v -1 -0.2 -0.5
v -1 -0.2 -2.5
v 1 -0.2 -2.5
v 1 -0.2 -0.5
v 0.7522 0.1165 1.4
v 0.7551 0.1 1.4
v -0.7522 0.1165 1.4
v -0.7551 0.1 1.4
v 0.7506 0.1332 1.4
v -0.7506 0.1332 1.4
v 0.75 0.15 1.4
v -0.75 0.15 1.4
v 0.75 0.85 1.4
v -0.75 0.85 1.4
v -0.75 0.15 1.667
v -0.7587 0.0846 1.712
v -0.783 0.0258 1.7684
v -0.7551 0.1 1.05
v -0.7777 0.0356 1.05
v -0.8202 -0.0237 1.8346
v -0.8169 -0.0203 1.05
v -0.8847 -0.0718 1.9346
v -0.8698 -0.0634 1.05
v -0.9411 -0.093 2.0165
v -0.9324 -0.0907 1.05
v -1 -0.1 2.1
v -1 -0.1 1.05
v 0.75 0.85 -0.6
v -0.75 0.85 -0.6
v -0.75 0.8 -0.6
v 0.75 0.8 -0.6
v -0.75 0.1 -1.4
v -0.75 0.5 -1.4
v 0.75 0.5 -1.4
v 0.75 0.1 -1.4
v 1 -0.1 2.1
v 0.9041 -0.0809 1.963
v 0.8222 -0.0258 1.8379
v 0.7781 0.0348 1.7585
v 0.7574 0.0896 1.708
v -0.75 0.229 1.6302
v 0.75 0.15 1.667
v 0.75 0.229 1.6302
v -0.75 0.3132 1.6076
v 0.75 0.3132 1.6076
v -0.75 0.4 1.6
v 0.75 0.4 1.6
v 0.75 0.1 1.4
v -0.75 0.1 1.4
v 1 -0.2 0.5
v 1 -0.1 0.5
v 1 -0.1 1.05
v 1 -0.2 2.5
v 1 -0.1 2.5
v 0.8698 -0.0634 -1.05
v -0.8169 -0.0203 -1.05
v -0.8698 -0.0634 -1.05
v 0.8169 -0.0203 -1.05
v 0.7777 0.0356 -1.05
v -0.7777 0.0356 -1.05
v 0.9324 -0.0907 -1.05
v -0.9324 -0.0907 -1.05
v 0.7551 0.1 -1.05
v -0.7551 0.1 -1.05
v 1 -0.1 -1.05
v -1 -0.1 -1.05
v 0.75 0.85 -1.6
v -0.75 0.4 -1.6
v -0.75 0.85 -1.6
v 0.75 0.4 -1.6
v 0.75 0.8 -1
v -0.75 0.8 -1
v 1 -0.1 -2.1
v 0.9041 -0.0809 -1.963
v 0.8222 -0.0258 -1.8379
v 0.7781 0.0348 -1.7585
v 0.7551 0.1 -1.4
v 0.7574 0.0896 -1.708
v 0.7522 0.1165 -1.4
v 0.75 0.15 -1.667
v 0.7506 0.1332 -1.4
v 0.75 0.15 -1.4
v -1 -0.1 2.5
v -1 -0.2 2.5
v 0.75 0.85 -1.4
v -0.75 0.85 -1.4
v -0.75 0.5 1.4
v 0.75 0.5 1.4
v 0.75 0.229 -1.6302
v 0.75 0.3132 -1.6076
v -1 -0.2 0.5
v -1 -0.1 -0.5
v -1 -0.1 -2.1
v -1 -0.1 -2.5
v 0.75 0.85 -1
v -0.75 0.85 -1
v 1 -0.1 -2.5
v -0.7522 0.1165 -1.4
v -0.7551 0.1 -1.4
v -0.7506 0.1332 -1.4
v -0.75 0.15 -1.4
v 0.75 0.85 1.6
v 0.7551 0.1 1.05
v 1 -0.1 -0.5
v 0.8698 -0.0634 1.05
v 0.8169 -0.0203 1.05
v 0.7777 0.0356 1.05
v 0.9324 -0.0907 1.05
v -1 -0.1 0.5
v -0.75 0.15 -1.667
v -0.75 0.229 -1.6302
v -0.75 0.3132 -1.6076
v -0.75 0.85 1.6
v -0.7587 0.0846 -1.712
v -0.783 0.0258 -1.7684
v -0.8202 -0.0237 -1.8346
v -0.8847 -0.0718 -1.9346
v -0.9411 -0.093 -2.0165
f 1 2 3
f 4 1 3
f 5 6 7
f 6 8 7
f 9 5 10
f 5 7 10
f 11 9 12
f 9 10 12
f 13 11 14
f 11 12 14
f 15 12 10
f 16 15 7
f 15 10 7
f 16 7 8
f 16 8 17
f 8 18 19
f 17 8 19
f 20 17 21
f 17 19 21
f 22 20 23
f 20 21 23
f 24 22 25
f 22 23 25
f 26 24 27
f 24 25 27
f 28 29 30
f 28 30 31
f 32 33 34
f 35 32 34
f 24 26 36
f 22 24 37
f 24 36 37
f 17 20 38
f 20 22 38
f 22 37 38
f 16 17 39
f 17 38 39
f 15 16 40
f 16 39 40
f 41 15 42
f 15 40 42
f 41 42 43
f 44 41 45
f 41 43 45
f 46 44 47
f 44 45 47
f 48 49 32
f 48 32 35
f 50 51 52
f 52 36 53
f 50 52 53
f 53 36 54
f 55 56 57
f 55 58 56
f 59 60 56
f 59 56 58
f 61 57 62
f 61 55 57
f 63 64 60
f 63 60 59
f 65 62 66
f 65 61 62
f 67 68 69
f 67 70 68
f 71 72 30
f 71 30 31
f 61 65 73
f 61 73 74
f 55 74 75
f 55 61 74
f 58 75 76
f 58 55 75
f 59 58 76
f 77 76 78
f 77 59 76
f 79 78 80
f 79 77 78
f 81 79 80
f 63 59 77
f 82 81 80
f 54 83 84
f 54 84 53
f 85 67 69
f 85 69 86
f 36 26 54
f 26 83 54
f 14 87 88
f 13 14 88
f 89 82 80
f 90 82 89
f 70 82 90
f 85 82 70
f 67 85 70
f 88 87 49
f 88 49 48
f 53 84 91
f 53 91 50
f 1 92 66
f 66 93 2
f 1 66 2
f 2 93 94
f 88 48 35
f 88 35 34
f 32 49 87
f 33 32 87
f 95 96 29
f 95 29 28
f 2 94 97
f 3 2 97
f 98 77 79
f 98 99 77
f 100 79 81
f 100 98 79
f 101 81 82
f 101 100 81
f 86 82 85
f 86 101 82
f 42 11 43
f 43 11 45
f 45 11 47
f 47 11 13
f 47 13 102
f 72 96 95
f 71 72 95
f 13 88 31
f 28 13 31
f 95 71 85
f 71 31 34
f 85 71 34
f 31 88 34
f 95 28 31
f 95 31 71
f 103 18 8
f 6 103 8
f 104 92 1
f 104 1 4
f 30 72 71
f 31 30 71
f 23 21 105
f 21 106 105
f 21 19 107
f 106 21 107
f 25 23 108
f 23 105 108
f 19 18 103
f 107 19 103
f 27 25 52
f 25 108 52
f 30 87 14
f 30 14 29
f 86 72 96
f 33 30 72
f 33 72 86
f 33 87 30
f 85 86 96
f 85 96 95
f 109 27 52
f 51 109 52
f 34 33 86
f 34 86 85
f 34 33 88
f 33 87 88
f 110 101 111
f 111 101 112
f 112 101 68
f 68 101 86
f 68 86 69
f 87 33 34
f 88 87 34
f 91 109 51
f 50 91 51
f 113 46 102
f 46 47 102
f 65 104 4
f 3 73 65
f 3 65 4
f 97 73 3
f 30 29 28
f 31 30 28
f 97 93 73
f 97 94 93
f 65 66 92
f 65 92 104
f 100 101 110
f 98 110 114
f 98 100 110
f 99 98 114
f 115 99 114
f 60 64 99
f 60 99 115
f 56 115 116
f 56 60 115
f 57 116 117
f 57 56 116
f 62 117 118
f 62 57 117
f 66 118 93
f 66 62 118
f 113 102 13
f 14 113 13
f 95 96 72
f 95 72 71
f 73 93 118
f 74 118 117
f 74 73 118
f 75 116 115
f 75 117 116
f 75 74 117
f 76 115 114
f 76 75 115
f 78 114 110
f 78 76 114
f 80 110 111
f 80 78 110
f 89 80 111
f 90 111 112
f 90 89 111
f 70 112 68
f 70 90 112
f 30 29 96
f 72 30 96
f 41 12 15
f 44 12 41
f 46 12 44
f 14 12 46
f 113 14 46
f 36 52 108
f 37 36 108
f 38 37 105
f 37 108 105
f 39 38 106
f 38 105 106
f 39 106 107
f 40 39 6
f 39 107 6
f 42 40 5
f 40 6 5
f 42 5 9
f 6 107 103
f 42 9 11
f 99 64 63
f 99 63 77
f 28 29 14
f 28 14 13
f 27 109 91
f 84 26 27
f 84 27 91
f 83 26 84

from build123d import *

# Parameters (mm, degrees)
SKETCH1_W           = 1.5
SKETCH1_H           = 0.4
BOSS_EXTRUDE1_DEPTH = 1.4
BOSS_EXTRUDE2_DEPTH = 0.75
SKETCH3_W           = 1.5
SKETCH3_H           = 2.8
BOSS_EXTRUDE3_DEPTH = 0.35
SKETCH4_W           = 2
SKETCH4_H           = 2
BOSS_EXTRUDE4_DEPTH = 0.1
SKETCH5_W           = 1.5
SKETCH5_H           = 0.4
CUT_EXTRUDE1_DEPTH  = 0.05
SKETCH5_2_W         = 1.5
SKETCH5_2_H         = 0.4
BOSS_EXTRUDE5_DEPTH = 0.05
FILLET1_R           = 0.5
FILLET2_START       = 1.05
FILLET2_DEPTH       = 0.5499999
FILLET2_START_2     = 1.5999999
FILLET2_2_DEPTH     = 0.5000001
FILLET2_START_3     = -2
FILLET2_3_OUTLINE_W = 0.05
FILLET2_3_OUTLINE_H = 0.35
FILLET2_3_DEPTH     = 4


with BuildPart() as part:
    # Sketch1 → Boss-Extrude1 (new, symmetric)
    with BuildSketch(Plane.XY):
        with Locations((0, 0.3)):
            Rectangle(SKETCH1_W, SKETCH1_H)
    extrude(amount=BOSS_EXTRUDE1_DEPTH, both=True)


with BuildPart() as body_2:
    # Sketch2 → Boss-Extrude2 (new, symmetric)
    with BuildSketch(Plane(origin=(0, 0, 0), x_dir=(0, 0, -1), z_dir=(1, 0, 0))):
        Polygon((-1.6, 0.85), (-1.4, 0.85), (-1.4, 0.1), (-1.05, 0.1), (-1.05, -0.1), (-1.6, -0.1), align=None)
    extrude(amount=BOSS_EXTRUDE2_DEPTH, both=True)

    # Sketch4 → Boss-Extrude4 (add)
    with BuildSketch(Plane.XZ.offset(0.1)):
        with Locations((0, 1.5)):
            Rectangle(SKETCH4_W, SKETCH4_H)
    extrude(amount=BOSS_EXTRUDE4_DEPTH)

    # Fillet1
    fillet1_edges = [body_2.edges().sort_by_distance(p)[0] for p in [
        (0, -0.1, 1.6),
    ]]
    fillet(fillet1_edges, radius=FILLET1_R)

    # Fillet2: read off the stored shape, not the designer's step
    # Fillet2 outline → Fillet2 (add)
    with BuildSketch(Plane.XY.offset(FILLET2_START)):
        with BuildLine():
            Line((-0.75, -0.1), (-0.75, 0.15))
            ThreePointArc((-0.75, 0.15), (-0.823223305, -0.026776695), (-1, -0.1))
            Line((-1, -0.1), (-0.75, -0.1))
        make_face()
        with BuildLine():
            Line((0.75, 0.15), (0.75, -0.1))
            Line((0.75, -0.1), (1, -0.1))
            ThreePointArc((1, -0.1), (0.823223305, -0.026776695), (0.75, 0.15))
        make_face()
    extrude(amount=FILLET2_DEPTH)

    # Fillet2 2 outline → Fillet2 2 (add)
    with BuildSketch(Plane.XY.offset(FILLET2_START_2)):
        with BuildLine():
            Line((-0.75, -0.1), (-0.75, 0.15))
            ThreePointArc((-0.75, 0.15), (-0.823223305, -0.026776695), (-1, -0.1))
            Line((-1, -0.1), (-0.75, -0.1))
        make_face()
        with BuildLine():
            Line((0.75, 0.15), (0.75, -0.1))
            Line((0.75, -0.1), (1, -0.1))
            ThreePointArc((1, -0.1), (0.823223305, -0.026776695), (0.75, 0.15))
        make_face()
    extrude(amount=FILLET2_2_DEPTH)

    # Fillet2 3 outline → Fillet2 3 (cut)
    with BuildSketch(Plane.YZ.offset(FILLET2_START_3)):
        with BuildLine():
            ThreePointArc((-0.1, 2.1), (-0.033012702, 1.85), (0.15, 1.666987298))
            Line((0.15, 1.666987298), (0.15, 2.1))
            Line((0.15, 2.1), (-0.1, 2.1))
        make_face()
        with Locations((0.125, 1.225)):
            Rectangle(FILLET2_3_OUTLINE_W, FILLET2_3_OUTLINE_H)
    extrude(amount=FILLET2_3_DEPTH, mode=Mode.SUBTRACT)


with BuildPart() as body_3:
    # Sketch3 → Boss-Extrude3 (new body)
    with BuildSketch(Plane(origin=(0, 0.5, 0), x_dir=(1, 0, 0), z_dir=(0, 1, 0))):
        Rectangle(SKETCH3_W, SKETCH3_H)
    extrude(amount=BOSS_EXTRUDE3_DEPTH)

    # Sketch5 → Cut-Extrude1 (cut)
    with BuildSketch(Plane(origin=(0, 0.85, 0), x_dir=(1, 0, 0), z_dir=(0, 1, 0))):
        with Locations((0, 0.8)):
            Rectangle(SKETCH5_W, SKETCH5_H)
    extrude(amount=-CUT_EXTRUDE1_DEPTH, mode=Mode.SUBTRACT)


with BuildPart() as body_4:
    # Sketch5<2> → Boss-Extrude5 (new body)
    with BuildSketch(Plane(origin=(0, 0.85, 0), x_dir=(1, 0, 0), z_dir=(0, 1, 0))):
        with Locations((0, 0.8)):
            Rectangle(SKETCH5_2_W, SKETCH5_2_H)
    extrude(amount=-BOSS_EXTRUDE5_DEPTH)


with BuildPart() as body_5:
    # Mirror1: mirrored copy
    add(body_2.part.mirror(Plane.XY))


solid = Compound([part.part, body_2.part, body_3.part, body_4.part, body_5.part])
